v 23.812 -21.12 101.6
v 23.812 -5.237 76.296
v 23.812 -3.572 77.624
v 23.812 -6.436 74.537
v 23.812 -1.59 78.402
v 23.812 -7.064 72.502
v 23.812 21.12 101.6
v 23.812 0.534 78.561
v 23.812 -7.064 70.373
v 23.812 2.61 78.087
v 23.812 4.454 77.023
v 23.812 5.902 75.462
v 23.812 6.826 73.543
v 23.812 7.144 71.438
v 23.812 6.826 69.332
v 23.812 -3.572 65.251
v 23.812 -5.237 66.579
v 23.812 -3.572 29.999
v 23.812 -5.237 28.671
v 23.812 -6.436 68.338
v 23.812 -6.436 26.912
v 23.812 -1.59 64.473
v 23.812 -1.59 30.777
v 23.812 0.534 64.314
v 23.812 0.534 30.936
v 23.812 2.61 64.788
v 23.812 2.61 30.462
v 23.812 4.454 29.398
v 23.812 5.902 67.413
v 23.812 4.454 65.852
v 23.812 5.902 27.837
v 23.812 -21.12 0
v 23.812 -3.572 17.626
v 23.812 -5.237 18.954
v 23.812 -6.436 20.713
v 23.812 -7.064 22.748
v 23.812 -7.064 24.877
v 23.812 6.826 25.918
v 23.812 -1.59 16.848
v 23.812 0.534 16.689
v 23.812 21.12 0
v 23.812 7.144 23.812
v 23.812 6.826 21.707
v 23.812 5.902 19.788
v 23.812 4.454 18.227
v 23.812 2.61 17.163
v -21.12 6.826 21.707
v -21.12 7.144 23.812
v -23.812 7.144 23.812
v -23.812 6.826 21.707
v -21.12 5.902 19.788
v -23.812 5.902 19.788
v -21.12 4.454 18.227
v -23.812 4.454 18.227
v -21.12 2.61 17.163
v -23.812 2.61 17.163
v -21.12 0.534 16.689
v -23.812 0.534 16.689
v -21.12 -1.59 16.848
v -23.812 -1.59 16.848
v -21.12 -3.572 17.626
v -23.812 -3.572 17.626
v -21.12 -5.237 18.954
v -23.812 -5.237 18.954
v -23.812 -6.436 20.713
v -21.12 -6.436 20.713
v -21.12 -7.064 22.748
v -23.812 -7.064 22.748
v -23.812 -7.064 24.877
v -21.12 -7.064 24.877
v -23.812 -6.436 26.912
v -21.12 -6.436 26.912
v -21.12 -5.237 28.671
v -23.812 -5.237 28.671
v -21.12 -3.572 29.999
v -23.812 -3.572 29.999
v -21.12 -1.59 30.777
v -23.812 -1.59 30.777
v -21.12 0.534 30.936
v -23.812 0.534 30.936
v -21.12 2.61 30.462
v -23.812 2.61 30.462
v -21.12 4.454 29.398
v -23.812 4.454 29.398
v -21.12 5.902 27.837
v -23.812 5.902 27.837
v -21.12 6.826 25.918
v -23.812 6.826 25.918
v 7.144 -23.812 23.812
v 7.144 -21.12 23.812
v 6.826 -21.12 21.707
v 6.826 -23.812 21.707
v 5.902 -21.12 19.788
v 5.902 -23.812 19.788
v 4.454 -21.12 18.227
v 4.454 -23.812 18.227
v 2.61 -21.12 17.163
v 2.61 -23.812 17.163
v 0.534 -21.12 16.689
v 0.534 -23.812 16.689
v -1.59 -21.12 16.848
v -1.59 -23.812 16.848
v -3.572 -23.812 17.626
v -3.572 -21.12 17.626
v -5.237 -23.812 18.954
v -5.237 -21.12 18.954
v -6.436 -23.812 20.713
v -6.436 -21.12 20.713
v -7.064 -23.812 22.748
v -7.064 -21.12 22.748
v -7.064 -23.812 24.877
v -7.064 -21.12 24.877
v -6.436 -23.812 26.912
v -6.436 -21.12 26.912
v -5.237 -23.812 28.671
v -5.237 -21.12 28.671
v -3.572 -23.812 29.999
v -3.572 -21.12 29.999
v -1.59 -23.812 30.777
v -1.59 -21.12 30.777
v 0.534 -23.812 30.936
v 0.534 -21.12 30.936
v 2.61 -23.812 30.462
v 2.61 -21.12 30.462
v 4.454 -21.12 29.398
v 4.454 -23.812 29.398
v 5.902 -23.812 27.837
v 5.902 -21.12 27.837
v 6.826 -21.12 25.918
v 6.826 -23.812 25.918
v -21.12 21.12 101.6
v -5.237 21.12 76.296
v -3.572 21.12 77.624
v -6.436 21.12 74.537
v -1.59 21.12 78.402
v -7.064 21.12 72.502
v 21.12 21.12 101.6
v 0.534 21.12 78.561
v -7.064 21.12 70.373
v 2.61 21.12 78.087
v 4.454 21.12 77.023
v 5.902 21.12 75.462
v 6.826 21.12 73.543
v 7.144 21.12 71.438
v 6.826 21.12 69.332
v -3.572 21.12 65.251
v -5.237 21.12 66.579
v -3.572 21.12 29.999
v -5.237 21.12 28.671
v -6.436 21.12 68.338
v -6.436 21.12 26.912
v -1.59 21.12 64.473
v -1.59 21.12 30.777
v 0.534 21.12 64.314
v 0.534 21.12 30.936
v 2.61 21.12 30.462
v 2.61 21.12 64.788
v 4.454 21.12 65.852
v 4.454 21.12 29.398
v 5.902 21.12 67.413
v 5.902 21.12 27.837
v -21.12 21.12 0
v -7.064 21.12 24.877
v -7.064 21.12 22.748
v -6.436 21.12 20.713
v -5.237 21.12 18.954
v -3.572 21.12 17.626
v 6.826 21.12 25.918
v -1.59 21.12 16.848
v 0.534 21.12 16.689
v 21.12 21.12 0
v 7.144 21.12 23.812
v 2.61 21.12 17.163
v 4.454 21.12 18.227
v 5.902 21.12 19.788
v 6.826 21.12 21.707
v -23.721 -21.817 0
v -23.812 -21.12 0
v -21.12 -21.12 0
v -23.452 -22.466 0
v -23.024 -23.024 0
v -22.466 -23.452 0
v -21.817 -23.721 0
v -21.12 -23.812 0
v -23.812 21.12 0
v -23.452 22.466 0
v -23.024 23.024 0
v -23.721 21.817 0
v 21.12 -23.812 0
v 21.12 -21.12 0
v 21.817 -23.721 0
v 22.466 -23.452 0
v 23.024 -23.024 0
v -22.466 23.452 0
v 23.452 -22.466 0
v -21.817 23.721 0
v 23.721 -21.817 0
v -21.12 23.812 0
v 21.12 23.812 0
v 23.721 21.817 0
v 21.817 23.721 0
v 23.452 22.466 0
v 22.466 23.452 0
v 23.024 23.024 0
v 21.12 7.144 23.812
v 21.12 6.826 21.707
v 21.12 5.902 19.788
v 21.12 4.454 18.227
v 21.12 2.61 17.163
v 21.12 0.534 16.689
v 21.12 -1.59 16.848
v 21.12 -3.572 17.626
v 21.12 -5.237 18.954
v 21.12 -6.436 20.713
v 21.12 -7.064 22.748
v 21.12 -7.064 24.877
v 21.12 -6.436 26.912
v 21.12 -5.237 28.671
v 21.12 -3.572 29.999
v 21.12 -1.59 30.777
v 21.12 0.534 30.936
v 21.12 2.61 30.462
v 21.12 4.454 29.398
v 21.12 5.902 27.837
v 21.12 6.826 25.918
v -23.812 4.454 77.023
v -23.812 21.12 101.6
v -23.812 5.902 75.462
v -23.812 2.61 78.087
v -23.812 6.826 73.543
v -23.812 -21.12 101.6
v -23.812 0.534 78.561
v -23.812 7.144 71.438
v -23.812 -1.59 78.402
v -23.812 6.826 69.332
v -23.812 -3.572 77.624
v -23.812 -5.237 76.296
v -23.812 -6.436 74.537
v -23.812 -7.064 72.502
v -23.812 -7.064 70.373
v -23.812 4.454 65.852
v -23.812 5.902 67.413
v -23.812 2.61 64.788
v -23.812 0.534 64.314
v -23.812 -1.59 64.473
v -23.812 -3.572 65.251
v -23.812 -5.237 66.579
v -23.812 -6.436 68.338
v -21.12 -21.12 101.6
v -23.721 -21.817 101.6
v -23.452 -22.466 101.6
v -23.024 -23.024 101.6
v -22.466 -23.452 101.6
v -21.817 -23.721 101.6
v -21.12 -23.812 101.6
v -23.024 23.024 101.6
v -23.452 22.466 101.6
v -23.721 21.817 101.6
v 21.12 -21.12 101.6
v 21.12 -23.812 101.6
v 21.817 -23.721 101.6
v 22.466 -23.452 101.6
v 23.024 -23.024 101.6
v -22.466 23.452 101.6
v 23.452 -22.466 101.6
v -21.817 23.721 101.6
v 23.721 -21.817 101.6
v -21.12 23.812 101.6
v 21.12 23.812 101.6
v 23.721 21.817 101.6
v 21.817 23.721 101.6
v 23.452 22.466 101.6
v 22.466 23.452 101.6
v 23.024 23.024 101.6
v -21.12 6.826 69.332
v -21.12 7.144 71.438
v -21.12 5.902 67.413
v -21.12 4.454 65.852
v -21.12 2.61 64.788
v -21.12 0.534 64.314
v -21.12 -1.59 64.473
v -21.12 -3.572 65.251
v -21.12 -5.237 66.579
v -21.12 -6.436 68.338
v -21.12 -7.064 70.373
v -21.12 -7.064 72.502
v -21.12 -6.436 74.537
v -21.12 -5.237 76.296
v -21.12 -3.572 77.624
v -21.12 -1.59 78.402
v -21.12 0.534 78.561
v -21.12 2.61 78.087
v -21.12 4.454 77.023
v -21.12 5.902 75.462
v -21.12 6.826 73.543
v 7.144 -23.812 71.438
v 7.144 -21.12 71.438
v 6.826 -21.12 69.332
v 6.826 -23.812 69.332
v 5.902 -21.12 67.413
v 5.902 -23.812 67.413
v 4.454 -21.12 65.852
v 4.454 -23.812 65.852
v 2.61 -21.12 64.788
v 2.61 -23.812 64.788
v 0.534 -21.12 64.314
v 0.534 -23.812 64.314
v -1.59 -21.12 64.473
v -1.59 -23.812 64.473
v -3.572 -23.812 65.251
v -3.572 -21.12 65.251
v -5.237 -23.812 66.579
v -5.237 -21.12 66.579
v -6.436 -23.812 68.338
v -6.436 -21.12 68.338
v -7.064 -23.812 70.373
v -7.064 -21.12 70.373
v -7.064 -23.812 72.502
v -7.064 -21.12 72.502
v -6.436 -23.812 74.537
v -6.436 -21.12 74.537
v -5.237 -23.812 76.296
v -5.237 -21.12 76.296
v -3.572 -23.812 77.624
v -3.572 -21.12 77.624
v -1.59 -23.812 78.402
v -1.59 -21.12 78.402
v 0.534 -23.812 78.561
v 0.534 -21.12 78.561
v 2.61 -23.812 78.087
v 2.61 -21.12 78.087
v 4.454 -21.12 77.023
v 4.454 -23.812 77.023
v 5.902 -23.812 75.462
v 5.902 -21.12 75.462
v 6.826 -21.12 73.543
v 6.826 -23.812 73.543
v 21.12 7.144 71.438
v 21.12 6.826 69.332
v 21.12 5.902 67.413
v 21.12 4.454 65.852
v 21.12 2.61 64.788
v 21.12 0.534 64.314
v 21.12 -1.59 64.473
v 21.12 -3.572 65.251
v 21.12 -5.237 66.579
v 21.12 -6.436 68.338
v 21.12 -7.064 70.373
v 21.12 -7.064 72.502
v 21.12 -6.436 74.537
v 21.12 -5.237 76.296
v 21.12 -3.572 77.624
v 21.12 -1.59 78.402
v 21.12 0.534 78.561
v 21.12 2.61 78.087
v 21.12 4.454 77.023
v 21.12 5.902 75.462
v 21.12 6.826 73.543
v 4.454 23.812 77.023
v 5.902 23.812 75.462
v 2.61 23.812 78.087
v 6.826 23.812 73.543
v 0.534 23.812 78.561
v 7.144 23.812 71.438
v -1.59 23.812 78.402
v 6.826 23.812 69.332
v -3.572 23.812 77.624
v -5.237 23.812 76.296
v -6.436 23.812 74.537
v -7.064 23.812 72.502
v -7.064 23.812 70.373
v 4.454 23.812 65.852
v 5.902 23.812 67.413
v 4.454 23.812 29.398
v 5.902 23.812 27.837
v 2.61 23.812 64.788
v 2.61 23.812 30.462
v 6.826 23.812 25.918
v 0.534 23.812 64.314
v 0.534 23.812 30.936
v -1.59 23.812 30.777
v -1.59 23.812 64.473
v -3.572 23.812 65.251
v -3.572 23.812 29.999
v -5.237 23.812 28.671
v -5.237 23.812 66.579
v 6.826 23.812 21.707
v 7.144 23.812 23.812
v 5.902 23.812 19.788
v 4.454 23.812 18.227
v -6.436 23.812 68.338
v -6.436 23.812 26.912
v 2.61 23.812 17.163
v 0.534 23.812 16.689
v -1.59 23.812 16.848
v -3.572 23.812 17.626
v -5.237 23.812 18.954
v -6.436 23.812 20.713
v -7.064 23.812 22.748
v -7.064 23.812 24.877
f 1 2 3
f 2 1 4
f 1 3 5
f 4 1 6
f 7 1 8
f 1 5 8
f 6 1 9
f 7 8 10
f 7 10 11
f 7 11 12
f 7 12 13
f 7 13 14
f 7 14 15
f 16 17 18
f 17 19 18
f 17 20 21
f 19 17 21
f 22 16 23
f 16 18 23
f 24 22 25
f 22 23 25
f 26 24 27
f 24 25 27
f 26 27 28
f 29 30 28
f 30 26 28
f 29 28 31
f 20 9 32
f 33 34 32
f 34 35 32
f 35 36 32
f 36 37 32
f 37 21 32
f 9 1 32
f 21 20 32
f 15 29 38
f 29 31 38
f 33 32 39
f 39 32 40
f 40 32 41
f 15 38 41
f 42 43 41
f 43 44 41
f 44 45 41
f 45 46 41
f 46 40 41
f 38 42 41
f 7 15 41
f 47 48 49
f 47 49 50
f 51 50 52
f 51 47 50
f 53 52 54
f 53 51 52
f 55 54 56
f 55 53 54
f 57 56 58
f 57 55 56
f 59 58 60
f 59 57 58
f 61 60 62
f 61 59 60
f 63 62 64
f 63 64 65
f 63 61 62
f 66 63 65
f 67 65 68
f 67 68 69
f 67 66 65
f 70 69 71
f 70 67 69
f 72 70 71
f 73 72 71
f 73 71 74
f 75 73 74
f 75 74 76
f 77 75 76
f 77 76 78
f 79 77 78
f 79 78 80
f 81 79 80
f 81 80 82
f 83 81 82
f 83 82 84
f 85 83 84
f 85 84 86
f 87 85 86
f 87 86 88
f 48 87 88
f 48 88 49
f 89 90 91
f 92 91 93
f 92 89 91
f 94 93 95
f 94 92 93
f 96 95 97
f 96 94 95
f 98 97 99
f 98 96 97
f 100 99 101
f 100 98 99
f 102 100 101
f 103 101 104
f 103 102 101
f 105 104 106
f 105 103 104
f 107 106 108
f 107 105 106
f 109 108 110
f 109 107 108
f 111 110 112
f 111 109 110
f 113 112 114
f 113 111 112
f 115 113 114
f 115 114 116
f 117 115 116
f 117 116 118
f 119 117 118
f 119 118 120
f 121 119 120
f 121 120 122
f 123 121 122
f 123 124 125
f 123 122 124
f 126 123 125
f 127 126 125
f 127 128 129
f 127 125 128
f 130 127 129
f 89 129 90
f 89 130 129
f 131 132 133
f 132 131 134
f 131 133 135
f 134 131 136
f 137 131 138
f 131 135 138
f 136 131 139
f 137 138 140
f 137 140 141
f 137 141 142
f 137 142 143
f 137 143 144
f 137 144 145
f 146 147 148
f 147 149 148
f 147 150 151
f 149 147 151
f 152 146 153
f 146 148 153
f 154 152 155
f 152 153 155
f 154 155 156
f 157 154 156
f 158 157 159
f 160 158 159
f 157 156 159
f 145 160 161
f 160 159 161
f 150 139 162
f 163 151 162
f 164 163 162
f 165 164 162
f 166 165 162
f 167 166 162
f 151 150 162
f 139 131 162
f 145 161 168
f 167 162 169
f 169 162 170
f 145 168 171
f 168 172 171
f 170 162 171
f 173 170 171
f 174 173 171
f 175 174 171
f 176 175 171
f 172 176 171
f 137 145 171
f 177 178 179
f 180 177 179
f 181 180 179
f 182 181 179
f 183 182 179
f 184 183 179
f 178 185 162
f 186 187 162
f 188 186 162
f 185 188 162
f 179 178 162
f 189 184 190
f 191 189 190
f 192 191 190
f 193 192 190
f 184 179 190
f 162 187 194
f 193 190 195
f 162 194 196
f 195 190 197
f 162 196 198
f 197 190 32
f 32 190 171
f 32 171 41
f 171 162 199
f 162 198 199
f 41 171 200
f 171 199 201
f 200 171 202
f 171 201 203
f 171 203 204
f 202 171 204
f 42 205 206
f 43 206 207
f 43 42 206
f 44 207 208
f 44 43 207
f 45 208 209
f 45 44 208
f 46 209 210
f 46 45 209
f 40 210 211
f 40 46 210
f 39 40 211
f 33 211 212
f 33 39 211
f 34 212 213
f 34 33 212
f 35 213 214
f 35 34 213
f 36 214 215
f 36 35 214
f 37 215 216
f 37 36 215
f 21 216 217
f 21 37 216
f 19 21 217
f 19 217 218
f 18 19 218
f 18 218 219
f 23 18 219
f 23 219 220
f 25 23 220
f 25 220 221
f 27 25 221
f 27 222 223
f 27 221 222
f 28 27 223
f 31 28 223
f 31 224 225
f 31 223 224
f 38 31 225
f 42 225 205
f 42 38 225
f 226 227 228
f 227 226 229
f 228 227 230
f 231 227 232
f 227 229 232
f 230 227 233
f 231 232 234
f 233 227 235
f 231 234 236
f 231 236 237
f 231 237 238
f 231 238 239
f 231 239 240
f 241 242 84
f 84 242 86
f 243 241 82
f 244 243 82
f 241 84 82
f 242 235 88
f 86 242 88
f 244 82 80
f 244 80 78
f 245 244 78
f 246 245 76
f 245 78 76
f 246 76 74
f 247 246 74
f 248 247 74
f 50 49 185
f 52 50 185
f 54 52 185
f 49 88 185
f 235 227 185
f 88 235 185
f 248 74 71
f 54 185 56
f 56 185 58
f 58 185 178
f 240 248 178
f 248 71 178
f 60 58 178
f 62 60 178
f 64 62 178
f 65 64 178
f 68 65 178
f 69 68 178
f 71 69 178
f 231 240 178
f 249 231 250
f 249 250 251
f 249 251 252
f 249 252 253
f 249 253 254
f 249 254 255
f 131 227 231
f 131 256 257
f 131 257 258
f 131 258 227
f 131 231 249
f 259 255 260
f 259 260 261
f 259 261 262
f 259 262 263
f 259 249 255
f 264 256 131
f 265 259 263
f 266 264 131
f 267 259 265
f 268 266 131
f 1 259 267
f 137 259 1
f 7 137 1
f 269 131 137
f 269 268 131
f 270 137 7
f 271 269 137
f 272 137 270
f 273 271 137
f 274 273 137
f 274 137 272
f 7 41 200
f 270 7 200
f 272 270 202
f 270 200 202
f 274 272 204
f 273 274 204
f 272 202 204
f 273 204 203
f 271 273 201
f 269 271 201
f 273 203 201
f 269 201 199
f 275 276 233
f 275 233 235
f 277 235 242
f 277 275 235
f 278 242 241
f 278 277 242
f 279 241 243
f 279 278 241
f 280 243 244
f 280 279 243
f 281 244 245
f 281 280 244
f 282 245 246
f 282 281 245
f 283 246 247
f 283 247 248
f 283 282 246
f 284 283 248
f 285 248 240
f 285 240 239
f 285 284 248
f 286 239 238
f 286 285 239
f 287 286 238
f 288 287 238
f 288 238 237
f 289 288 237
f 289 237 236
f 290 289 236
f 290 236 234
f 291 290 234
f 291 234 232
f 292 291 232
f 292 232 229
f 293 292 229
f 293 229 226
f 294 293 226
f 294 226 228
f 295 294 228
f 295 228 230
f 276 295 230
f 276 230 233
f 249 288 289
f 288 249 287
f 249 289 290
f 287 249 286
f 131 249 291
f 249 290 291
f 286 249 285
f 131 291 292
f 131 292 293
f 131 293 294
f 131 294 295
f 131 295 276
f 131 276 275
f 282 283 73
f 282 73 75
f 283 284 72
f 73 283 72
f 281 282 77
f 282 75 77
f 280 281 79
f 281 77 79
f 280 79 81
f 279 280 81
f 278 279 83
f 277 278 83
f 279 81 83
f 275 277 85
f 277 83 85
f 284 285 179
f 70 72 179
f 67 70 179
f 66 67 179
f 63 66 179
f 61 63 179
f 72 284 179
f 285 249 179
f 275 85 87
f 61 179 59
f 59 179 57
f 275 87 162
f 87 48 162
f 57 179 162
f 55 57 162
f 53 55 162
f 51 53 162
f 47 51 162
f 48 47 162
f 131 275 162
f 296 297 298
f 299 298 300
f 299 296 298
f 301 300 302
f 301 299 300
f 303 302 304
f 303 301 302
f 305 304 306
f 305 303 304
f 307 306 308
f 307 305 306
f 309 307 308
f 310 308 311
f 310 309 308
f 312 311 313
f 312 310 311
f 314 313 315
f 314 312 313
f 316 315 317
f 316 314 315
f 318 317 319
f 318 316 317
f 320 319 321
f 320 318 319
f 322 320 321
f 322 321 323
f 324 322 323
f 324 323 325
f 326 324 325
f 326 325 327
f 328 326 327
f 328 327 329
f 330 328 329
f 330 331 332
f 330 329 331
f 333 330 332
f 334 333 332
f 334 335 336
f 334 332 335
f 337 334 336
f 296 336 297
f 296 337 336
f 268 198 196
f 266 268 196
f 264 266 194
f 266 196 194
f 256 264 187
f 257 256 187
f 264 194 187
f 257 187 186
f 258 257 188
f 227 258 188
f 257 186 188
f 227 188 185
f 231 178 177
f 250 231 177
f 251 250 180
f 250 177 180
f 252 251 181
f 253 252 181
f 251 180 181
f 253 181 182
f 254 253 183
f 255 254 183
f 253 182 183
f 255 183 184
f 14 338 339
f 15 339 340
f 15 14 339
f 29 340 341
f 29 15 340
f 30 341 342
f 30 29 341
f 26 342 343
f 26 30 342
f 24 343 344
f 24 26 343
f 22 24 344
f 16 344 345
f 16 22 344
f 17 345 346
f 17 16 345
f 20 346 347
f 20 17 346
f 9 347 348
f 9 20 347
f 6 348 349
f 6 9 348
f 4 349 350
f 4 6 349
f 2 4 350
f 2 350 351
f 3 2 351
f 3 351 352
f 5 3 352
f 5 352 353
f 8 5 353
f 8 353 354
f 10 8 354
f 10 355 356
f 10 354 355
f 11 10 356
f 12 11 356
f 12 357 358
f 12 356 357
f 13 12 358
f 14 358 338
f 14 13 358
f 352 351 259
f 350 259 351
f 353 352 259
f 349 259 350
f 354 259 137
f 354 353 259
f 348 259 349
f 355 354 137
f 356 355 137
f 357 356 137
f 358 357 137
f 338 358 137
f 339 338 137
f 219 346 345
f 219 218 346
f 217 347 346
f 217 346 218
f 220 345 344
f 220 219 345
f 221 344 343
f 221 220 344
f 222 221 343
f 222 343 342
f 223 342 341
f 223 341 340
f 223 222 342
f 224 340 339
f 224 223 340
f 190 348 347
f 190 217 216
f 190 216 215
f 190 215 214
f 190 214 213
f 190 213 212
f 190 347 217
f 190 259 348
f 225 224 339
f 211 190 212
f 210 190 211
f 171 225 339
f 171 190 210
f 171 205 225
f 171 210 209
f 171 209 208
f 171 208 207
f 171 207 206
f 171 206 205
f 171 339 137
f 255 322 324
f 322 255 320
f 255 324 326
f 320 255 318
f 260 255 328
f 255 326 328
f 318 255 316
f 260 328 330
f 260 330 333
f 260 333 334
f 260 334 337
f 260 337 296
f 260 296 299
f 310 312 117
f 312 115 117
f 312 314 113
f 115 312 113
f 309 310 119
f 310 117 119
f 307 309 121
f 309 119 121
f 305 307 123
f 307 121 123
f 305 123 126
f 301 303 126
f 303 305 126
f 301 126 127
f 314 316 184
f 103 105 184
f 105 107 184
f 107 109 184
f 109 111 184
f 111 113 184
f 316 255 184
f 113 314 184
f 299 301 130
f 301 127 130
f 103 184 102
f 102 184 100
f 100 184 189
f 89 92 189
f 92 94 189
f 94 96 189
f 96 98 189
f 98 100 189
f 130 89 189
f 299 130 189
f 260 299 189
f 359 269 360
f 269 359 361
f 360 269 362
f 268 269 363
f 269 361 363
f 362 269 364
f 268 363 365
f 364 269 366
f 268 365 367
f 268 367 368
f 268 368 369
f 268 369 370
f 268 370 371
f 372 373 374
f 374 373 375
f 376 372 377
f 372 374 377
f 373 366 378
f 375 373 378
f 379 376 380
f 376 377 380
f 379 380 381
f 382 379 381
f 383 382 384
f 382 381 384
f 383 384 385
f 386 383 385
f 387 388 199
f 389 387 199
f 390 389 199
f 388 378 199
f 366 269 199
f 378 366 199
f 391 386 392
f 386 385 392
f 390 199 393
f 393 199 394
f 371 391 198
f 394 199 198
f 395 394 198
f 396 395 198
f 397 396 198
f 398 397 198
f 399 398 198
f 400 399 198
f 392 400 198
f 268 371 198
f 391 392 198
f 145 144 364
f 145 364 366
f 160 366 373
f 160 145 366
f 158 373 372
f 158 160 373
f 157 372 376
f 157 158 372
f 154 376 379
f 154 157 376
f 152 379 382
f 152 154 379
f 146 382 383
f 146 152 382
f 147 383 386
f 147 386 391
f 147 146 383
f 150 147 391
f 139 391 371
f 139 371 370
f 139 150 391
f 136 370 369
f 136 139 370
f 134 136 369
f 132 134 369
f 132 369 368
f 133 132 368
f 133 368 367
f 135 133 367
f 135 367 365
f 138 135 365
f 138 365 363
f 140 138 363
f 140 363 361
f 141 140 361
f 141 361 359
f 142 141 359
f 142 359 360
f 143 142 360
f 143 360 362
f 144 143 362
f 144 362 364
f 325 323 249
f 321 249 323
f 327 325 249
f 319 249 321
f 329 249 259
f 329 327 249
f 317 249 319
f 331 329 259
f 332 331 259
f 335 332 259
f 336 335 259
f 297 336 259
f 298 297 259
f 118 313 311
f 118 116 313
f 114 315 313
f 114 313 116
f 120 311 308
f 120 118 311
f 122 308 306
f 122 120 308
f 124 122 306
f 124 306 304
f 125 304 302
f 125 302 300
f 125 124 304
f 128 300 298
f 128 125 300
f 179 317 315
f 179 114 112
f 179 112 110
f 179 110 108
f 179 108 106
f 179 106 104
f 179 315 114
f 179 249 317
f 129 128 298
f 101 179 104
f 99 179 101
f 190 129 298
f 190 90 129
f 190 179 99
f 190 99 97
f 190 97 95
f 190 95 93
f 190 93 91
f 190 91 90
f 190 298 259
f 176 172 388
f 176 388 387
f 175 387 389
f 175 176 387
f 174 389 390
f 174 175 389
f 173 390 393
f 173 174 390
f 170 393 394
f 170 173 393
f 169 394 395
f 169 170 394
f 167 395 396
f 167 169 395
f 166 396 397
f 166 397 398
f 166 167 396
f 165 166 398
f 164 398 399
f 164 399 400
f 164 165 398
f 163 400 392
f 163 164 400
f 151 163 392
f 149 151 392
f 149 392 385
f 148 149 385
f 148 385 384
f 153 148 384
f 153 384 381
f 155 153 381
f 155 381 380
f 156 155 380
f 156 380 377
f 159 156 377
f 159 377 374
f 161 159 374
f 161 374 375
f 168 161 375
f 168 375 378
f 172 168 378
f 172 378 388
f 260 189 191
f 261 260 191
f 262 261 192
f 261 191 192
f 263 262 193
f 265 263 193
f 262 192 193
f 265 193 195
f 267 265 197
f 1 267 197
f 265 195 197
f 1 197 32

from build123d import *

# Parameters (mm, degrees)
SKETCH1_W                 = 42.2402
SKETCH1_H                 = 42.2402
BASE_EXTRUDE_DEPTH        = 101.6
HOLE1_START               = -23.8125
HOLE1_OUTLINE_R           = 7.14375
HOLE1_DEPTH               = 47.625
CIRPATTERN2_COUNT         = 2
CIRPATTERN2_ANGLE         = 90
LPATTERN1_COUNT           = 2
LPATTERN1_PITCH           = 47.625
LPATTERN1_START           = -23.8125
LPATTERN1_COPY_1_SKETCH_R = 7.14375
LPATTERN1_COPY_1_DEPTH    = 47.625


# Read off the part's stored shape, not the designer's step: Hole1
with BuildPart() as part:
    # Sketch1 → Base-Extrude (new body)
    with BuildSketch(Plane.XY):
        with BuildLine():
            Line((-23.8125, 21.1201), (-23.8125, -21.1201))
            ThreePointArc((-23.8125, -21.1201), (-23.023914298, -23.023914298), (-21.1201, -23.8125))
            Line((-21.1201, -23.8125), (21.1201, -23.8125))
            ThreePointArc((21.1201, -23.8125), (23.023914298, -23.023914298), (23.8125, -21.1201))
            Line((23.8125, -21.1201), (23.8125, 21.1201))
            ThreePointArc((23.8125, 21.1201), (23.023914298, 23.023914298), (21.1201, 23.8125))
            Line((21.1201, 23.8125), (-21.1201, 23.8125))
            ThreePointArc((-21.1201, 23.8125), (-23.023914298, 23.023914298), (-23.8125, 21.1201))
        make_face()
        Rectangle(SKETCH1_W, SKETCH1_H, mode=Mode.SUBTRACT)
    extrude(amount=BASE_EXTRUDE_DEPTH)

    # Hole1 outline → Hole1 (cut)
    with BuildSketch(Plane(origin=(0, 0, 0), x_dir=(1, 0, 0), z_dir=(0, 1, 0)).offset(HOLE1_START)):
        with Locations((0, -23.8125)):
            Circle(HOLE1_OUTLINE_R)
    hole1 = extrude(amount=HOLE1_DEPTH, mode=Mode.SUBTRACT)

    # CirPattern2: Hole1 ×2 about axis
    cirpattern2_axis = Axis((0, 0, -50), (0, 0, 1))
    for i in range(1, CIRPATTERN2_COUNT):
        add(hole1.rotate(cirpattern2_axis, i * CIRPATTERN2_ANGLE / (CIRPATTERN2_COUNT - 1)), mode=Mode.SUBTRACT)

    # LPattern1: Hole1 ×2
    with Locations(*[(0, 0, i * LPATTERN1_PITCH) for i in range(1, LPATTERN1_COUNT)]):
        add(hole1, mode=Mode.SUBTRACT)

    # LPattern1 copy 1 sketch → LPattern1 copy 1 (cut)
    with BuildSketch(Plane(origin=(0, 0, 47.625), x_dir=(0, 1, 0), z_dir=(-1, 0, 0)).offset(LPATTERN1_START)):
        with Locations((0, -23.8125)):
            Circle(LPATTERN1_COPY_1_SKETCH_R)
    extrude(amount=LPATTERN1_COPY_1_DEPTH, mode=Mode.SUBTRACT)


solid = part.part
